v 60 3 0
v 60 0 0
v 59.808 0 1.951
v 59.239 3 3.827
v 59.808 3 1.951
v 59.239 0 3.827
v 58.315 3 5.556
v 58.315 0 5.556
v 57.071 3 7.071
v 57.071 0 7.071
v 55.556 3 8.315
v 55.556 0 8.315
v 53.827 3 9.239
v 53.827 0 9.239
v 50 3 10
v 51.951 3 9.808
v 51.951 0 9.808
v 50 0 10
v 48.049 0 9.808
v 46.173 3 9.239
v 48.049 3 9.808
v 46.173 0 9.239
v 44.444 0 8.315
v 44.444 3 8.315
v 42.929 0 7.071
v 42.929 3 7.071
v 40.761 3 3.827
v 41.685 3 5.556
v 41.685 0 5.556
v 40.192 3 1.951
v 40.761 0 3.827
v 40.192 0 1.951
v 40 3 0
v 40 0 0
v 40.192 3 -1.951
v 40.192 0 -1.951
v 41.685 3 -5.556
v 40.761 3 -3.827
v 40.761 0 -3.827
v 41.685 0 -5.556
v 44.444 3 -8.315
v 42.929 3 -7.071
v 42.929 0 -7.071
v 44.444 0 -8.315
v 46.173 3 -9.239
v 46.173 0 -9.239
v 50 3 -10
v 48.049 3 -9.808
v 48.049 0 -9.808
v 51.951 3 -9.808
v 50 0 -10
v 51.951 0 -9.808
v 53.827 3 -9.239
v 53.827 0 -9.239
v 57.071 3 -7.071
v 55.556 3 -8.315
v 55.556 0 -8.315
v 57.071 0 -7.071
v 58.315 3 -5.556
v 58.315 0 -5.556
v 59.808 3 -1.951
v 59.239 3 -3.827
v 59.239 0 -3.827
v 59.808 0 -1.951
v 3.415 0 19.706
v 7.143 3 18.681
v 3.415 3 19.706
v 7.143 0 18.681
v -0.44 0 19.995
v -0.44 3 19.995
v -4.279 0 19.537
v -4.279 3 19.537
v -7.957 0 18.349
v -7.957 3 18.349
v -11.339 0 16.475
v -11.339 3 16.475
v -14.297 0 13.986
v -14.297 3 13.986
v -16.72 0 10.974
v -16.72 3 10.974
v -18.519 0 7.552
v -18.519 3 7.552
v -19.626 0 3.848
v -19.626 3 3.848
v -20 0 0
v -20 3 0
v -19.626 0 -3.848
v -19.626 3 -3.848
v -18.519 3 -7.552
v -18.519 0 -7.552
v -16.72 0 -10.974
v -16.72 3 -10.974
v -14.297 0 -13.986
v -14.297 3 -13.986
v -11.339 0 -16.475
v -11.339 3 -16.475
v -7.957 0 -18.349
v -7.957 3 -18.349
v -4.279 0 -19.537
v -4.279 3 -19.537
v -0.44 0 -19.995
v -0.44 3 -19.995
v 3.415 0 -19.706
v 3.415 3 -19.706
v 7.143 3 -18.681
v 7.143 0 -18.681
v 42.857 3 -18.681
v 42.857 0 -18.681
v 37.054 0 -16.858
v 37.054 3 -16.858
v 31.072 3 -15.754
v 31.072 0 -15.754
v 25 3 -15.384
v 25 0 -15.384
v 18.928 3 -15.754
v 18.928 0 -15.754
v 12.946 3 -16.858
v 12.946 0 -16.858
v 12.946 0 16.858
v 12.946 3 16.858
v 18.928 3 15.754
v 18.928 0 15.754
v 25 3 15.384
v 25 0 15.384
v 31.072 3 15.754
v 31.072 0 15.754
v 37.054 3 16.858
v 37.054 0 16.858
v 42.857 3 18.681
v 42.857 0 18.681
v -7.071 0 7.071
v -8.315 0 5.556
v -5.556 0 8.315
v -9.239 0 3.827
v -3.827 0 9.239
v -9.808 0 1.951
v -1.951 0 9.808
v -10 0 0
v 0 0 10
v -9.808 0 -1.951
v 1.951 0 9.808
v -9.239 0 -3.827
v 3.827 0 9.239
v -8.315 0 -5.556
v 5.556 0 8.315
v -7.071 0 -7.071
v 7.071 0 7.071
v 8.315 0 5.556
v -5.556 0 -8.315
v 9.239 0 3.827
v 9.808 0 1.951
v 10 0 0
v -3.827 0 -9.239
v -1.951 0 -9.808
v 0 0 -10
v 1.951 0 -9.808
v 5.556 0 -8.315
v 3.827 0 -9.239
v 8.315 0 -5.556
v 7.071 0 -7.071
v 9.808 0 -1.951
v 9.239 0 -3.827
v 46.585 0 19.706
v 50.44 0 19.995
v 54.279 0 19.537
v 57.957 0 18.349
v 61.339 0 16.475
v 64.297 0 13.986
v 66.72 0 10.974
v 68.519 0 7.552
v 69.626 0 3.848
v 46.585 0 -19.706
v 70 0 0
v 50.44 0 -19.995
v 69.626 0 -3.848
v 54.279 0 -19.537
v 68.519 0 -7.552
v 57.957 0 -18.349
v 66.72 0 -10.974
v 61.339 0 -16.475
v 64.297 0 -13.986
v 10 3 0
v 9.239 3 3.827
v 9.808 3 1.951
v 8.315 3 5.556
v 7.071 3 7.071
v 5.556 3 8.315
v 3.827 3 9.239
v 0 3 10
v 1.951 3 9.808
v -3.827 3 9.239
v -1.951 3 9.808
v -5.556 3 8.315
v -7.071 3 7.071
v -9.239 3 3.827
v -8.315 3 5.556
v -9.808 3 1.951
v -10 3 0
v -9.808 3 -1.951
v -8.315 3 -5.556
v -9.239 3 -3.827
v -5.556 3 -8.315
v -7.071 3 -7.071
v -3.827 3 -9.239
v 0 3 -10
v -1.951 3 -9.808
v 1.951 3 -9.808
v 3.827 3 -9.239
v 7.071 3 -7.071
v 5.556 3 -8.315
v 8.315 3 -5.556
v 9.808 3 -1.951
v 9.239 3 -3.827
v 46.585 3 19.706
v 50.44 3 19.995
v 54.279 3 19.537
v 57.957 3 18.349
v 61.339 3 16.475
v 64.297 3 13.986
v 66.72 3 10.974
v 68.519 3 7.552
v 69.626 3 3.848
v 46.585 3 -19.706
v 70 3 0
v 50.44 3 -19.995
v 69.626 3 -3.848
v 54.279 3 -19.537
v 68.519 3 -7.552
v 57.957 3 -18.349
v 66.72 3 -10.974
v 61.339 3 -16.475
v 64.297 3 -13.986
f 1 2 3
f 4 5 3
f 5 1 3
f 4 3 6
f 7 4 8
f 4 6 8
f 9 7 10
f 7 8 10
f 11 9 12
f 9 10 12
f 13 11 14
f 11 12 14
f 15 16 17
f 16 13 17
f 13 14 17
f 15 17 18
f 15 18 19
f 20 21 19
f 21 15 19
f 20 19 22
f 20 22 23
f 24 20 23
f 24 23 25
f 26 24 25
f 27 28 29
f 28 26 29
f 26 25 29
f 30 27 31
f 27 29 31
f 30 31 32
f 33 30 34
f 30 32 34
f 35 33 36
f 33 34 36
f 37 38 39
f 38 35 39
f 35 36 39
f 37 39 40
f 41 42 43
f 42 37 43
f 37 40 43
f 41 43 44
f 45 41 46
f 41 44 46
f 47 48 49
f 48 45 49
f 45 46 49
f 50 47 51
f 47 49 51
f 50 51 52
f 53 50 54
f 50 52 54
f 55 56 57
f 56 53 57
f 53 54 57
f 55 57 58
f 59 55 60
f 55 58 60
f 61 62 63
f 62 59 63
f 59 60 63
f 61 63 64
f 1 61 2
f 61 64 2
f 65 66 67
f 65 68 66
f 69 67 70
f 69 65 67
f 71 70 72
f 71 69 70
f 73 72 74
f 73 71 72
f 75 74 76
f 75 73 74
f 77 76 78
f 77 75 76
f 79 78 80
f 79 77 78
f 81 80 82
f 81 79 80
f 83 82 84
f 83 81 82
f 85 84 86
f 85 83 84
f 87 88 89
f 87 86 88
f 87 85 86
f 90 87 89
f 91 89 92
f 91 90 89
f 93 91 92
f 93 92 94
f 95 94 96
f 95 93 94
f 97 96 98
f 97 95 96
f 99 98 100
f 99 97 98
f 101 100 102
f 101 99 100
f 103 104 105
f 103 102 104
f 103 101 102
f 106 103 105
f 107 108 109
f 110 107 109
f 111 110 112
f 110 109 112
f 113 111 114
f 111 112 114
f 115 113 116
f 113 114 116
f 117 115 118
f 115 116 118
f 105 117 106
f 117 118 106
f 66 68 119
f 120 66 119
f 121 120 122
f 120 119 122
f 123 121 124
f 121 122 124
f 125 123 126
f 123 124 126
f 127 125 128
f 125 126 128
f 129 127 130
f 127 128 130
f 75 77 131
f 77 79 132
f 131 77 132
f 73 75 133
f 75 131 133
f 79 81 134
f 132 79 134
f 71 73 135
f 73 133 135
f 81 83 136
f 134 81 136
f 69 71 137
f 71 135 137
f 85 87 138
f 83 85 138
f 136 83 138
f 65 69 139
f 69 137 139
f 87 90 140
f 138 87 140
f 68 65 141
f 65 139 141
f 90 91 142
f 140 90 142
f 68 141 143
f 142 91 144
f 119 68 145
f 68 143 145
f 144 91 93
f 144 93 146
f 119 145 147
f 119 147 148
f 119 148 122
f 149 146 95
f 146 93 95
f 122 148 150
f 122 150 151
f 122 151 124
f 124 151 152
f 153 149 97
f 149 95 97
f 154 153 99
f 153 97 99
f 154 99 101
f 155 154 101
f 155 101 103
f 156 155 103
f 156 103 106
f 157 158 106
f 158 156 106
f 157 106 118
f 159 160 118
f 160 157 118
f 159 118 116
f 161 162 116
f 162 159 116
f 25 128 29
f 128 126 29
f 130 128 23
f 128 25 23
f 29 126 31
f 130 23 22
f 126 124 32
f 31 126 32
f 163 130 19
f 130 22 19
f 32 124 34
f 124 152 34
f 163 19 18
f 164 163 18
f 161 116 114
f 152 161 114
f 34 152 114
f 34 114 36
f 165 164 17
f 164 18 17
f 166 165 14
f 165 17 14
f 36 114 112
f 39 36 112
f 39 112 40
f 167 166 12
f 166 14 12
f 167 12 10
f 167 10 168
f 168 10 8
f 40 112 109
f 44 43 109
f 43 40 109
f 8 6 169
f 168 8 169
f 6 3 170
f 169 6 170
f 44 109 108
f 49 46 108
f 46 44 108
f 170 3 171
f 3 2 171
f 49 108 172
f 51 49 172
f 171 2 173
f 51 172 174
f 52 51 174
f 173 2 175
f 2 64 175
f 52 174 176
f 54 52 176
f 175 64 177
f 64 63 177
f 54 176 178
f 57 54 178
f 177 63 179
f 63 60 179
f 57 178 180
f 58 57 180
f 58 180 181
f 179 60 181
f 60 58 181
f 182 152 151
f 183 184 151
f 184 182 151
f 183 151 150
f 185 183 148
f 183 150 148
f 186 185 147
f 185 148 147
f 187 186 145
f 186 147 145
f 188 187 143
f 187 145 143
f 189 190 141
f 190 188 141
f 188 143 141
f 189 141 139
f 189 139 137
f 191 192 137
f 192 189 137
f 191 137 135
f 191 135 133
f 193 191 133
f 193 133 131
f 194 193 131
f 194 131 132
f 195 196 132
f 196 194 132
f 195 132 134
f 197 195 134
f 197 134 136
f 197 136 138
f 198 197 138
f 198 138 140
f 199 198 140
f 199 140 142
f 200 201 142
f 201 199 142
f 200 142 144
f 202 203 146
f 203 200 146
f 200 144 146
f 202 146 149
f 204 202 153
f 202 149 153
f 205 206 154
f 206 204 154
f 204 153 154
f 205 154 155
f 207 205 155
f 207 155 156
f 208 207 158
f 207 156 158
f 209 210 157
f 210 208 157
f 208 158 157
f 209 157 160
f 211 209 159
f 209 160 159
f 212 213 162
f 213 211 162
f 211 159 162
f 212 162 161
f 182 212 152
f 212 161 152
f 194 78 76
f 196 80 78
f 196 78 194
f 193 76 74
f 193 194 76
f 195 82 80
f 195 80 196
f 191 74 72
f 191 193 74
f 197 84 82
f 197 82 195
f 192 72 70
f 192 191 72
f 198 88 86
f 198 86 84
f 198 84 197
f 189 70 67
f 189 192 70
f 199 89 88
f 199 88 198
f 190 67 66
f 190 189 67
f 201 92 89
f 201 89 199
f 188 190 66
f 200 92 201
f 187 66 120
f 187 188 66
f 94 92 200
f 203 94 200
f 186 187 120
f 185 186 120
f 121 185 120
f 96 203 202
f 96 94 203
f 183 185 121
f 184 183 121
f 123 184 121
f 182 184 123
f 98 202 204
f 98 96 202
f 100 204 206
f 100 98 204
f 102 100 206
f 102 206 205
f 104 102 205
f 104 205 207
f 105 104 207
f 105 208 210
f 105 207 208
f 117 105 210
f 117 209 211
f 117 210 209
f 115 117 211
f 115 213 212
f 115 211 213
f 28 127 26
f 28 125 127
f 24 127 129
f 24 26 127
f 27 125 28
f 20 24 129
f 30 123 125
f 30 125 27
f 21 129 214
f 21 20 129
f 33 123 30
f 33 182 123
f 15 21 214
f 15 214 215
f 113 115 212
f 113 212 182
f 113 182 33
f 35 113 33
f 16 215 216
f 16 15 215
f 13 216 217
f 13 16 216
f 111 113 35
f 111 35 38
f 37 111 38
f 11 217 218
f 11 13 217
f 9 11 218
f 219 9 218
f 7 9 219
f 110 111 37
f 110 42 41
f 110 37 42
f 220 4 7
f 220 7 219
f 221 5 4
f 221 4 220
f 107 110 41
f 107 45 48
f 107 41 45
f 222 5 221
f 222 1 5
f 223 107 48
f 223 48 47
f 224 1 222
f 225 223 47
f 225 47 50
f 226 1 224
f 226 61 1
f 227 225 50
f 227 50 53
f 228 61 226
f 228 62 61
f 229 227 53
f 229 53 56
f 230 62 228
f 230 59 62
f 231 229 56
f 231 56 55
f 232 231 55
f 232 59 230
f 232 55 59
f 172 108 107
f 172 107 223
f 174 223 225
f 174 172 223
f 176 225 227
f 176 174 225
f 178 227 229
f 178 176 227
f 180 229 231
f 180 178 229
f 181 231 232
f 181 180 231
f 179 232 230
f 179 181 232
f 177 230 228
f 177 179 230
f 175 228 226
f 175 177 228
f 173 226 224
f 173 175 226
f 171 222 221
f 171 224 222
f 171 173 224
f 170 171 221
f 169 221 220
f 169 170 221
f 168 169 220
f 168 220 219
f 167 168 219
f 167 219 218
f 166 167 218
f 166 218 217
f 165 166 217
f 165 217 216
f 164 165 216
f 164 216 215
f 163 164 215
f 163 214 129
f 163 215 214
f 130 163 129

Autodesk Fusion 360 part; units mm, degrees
sketch "Sketch1" plane through (0, 0, 0) normal (0, 1, 0) x (1, 0, 0)
  line L0 (0, 0) -> (50, 0) construction
  circle A0 centre (50, 0) radius 10
  circle A1 centre (0, 0) radius 10
  arc A2 (42.8571, -18.681) -> (7.1429, -18.681) centre (25, -65.3835) ccw
  arc A3 (7.1429, 18.681) -> (42.8571, 18.681) centre (25, 65.3835) ccw
  arc A4 (7.1429, 18.681) -> (7.1429, -18.681) centre (0, 0) ccw
  arc A5 (42.8571, -18.681) -> (42.8571, 18.681) centre (50, 0) ccw
  dimension "d13" = 50
  dimension "d14" = 40
  dimension "d15" = 40
  dimension "d16" = 20
  dimension "d17" = 20
  dimension "d18" = 100
  dimension "d19" = 100
extrude "Extrude1" add sketch "Sketch1" along normal blind 3
